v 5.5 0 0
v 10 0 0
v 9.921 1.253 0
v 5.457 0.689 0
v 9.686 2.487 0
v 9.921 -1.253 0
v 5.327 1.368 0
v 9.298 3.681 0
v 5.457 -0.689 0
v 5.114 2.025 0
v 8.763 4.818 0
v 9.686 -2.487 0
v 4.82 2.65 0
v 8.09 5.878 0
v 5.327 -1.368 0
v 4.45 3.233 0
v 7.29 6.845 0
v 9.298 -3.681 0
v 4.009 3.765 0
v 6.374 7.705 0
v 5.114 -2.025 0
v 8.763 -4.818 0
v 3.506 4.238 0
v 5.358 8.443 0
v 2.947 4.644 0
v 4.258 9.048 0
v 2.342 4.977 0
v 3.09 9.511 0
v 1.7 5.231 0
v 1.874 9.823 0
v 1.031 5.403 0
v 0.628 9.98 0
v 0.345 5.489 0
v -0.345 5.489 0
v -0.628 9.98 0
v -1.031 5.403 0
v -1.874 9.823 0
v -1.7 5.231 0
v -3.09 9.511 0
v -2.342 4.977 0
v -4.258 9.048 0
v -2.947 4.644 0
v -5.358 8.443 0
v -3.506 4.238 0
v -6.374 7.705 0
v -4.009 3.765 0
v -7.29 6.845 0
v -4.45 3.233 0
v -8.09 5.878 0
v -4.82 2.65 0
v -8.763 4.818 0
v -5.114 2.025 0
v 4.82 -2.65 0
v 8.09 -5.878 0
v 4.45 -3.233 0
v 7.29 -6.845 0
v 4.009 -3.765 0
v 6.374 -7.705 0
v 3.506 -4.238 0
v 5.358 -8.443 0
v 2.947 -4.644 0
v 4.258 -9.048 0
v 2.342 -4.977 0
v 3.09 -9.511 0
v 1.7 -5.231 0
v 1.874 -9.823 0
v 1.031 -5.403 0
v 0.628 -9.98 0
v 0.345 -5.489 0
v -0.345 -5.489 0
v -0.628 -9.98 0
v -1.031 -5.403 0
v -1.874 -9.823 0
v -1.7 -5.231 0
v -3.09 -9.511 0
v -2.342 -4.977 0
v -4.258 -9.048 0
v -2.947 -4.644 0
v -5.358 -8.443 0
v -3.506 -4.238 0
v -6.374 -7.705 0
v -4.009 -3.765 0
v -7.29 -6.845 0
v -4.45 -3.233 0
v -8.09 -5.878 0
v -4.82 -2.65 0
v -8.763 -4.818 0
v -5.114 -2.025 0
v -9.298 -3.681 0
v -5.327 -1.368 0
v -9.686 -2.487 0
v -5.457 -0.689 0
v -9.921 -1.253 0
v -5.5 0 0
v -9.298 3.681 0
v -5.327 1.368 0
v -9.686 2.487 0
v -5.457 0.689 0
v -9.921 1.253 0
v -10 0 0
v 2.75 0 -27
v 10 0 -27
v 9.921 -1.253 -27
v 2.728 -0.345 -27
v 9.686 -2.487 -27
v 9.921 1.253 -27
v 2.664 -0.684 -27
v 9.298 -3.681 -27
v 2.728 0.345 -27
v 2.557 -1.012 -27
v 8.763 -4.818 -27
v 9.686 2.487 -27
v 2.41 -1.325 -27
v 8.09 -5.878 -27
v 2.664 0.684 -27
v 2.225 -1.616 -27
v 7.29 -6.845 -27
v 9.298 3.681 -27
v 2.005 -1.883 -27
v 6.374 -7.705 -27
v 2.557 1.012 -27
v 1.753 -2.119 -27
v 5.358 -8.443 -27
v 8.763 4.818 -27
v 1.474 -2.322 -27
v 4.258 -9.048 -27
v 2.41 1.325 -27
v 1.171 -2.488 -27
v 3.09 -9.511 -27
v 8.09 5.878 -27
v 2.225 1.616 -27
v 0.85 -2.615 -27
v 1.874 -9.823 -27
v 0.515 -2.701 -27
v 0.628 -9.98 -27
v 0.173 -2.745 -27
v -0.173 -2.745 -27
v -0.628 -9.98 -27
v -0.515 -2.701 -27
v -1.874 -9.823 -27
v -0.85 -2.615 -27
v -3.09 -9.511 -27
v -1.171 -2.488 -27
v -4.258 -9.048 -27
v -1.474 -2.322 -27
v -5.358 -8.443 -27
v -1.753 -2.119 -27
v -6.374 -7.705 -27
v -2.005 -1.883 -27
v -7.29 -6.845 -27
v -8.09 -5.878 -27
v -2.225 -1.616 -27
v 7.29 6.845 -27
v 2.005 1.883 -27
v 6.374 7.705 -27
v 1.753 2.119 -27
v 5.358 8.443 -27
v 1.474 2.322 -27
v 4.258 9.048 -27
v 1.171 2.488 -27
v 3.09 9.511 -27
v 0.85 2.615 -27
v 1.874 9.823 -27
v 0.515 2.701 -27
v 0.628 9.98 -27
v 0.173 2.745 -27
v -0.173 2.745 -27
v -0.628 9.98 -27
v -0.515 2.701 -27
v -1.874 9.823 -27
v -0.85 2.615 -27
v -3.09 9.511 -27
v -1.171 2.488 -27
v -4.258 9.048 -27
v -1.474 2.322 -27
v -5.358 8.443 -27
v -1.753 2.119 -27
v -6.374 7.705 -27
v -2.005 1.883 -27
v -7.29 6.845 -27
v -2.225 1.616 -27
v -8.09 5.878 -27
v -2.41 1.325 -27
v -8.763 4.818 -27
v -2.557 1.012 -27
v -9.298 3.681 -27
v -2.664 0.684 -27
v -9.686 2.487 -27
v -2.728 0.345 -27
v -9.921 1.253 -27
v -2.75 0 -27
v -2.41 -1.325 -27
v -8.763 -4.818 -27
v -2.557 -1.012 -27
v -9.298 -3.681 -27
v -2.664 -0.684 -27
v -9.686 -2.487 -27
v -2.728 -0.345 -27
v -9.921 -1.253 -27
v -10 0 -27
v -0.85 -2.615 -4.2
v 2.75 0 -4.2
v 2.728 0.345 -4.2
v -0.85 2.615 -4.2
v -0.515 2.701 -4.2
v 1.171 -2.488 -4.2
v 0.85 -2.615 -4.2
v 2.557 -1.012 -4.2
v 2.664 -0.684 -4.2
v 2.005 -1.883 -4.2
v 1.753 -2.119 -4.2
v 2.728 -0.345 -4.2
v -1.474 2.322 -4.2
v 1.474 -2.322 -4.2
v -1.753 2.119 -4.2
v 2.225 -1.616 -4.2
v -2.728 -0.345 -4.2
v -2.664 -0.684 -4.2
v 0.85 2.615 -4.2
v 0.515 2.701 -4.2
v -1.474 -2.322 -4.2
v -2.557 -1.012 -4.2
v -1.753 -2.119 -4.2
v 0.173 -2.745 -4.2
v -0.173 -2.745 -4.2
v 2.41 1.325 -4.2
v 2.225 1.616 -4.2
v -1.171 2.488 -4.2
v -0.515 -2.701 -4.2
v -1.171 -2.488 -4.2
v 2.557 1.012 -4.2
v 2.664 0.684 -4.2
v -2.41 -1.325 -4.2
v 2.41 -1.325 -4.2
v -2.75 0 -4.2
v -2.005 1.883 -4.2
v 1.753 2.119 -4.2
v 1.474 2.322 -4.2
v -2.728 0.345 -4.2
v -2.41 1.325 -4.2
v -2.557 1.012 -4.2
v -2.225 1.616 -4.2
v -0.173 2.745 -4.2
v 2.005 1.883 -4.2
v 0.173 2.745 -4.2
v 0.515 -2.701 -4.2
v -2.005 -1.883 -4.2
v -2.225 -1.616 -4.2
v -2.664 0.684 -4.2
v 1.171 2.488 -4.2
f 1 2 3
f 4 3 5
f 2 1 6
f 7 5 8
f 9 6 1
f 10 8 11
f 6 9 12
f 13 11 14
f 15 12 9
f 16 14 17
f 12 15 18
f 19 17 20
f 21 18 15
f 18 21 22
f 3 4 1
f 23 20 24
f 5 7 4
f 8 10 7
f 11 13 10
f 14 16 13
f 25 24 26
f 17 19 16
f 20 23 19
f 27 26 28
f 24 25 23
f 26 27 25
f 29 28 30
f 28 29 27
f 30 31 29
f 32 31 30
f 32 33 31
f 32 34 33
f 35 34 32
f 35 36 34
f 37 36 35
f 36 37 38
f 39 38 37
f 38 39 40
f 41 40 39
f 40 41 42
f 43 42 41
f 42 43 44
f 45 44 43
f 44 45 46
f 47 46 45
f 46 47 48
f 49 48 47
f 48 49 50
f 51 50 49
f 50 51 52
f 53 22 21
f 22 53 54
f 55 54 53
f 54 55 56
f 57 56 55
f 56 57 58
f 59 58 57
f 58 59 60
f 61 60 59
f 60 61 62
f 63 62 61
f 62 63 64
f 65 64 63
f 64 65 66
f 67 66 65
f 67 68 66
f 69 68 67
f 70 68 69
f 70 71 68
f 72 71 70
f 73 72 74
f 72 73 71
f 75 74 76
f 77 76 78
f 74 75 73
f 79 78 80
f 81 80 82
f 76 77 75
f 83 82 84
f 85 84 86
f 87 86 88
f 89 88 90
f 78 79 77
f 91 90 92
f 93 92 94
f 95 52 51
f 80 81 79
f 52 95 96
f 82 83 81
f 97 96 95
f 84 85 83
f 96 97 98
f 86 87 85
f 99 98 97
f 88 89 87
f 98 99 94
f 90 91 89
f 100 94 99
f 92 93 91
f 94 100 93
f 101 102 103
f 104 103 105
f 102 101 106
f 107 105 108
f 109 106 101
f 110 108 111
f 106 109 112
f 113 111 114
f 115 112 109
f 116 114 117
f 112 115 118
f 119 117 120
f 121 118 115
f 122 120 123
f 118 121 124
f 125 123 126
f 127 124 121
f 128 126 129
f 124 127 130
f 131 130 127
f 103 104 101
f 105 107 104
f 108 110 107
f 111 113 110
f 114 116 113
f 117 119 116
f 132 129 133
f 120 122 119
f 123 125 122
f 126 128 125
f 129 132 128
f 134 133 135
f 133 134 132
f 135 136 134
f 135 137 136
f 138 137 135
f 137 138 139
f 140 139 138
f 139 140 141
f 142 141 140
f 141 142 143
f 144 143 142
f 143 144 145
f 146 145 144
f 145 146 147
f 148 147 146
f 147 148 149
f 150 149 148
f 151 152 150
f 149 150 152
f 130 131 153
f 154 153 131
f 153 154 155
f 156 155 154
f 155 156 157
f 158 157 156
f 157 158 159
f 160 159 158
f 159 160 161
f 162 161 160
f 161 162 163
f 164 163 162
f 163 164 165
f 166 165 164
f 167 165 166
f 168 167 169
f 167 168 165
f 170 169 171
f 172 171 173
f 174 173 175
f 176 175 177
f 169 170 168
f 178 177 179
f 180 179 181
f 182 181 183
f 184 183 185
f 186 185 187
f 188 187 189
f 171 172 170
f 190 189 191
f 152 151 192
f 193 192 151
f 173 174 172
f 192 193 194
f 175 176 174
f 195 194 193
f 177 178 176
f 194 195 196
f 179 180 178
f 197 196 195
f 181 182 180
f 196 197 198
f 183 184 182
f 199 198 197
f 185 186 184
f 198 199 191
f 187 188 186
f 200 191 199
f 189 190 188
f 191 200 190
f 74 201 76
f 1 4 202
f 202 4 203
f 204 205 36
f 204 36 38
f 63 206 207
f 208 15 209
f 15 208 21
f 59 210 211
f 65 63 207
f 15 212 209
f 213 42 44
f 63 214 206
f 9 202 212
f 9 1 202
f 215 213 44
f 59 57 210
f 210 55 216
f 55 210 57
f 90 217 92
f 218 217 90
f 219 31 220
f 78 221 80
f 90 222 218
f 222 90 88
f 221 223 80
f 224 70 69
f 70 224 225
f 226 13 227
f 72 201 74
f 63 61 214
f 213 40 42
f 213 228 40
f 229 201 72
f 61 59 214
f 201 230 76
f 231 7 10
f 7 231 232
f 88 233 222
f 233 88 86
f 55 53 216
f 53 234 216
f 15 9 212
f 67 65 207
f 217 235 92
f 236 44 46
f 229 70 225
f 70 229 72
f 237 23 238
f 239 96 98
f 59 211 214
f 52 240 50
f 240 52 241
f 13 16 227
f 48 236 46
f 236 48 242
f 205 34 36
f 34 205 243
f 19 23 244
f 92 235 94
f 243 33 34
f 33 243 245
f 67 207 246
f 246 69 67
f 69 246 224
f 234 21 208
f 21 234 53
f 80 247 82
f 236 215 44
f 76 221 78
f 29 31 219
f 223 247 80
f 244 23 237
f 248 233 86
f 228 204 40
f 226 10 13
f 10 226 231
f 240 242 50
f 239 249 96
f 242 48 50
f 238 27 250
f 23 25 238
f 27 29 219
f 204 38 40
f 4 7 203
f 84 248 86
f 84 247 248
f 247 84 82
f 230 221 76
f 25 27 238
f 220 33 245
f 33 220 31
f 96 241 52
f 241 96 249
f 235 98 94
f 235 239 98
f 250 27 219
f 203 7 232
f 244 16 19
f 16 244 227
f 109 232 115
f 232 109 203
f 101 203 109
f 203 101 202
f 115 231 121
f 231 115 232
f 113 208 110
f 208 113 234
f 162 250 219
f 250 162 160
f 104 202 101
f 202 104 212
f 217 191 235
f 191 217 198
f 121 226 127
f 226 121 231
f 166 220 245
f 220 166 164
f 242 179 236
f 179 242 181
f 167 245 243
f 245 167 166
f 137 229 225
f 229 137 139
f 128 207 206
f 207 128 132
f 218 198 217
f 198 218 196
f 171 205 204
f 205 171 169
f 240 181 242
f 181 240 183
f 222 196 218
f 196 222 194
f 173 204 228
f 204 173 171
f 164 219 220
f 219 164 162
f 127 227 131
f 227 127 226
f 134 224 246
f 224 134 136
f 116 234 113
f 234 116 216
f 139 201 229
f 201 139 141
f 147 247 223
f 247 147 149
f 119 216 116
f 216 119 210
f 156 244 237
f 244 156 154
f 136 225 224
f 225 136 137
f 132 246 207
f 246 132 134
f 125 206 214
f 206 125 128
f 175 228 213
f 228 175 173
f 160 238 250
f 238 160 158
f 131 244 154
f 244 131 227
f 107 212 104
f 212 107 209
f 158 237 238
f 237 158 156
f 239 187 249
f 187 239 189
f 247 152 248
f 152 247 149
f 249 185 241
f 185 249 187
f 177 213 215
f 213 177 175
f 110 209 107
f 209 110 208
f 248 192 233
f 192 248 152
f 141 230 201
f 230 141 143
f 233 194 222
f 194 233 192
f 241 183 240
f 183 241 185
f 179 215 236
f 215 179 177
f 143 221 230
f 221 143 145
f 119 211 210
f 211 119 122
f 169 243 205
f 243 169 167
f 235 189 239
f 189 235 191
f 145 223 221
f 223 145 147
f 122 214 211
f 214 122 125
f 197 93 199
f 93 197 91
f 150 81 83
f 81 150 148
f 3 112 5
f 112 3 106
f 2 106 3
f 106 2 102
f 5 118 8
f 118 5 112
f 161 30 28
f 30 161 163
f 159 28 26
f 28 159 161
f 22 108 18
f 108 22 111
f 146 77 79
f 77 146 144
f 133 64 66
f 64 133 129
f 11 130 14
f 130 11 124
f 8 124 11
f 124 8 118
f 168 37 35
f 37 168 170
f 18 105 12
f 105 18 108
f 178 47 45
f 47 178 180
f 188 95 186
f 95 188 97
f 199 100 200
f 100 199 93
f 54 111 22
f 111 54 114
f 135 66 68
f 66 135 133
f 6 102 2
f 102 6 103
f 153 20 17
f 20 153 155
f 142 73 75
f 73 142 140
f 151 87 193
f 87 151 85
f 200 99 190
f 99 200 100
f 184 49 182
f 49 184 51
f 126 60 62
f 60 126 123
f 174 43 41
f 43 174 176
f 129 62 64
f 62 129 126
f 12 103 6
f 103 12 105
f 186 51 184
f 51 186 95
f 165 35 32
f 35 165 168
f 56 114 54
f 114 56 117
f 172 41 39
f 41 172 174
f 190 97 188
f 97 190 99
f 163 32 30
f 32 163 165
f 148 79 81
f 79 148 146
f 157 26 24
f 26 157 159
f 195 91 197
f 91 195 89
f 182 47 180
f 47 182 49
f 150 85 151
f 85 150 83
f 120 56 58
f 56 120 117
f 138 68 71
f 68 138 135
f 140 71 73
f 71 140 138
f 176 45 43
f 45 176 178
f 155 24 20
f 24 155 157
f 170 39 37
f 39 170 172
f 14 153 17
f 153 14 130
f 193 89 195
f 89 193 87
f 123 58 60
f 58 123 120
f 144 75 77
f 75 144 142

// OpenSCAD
$fn = 50;


difference() {
	union() {
		translate(v = [0, 0, -27.0000000000]) {
			cylinder(h = 27, r = 10.0000000000);
		}
		cylinder(h = 0, r = 20.0000000000);
	}
	union() {
		translate(v = [0, 0, 0]) {
			rotate(a = [0, 0, 0]) {
				difference() {
					union() {
						#translate(v = [0, 0, -27.0000000000]) {
							cylinder(h = 27, r = 2.2500000000);
						}
						#translate(v = [0, 0, -4.2000000000]) {
							cylinder(h = 4.2000000000, r = 10.0000000000, r1 = 2.7500000000, r2 = 5.5000000000);
						}
						#translate(v = [0, 0, -27.0000000000]) {
							cylinder(h = 27, r = 2.7500000000);
						}
						#translate(v = [0, 0, -27.0000000000]) {
							cylinder(h = 27, r = 2.2500000000);
						}
					}
					union();
				}
			}
		}
	}
}
